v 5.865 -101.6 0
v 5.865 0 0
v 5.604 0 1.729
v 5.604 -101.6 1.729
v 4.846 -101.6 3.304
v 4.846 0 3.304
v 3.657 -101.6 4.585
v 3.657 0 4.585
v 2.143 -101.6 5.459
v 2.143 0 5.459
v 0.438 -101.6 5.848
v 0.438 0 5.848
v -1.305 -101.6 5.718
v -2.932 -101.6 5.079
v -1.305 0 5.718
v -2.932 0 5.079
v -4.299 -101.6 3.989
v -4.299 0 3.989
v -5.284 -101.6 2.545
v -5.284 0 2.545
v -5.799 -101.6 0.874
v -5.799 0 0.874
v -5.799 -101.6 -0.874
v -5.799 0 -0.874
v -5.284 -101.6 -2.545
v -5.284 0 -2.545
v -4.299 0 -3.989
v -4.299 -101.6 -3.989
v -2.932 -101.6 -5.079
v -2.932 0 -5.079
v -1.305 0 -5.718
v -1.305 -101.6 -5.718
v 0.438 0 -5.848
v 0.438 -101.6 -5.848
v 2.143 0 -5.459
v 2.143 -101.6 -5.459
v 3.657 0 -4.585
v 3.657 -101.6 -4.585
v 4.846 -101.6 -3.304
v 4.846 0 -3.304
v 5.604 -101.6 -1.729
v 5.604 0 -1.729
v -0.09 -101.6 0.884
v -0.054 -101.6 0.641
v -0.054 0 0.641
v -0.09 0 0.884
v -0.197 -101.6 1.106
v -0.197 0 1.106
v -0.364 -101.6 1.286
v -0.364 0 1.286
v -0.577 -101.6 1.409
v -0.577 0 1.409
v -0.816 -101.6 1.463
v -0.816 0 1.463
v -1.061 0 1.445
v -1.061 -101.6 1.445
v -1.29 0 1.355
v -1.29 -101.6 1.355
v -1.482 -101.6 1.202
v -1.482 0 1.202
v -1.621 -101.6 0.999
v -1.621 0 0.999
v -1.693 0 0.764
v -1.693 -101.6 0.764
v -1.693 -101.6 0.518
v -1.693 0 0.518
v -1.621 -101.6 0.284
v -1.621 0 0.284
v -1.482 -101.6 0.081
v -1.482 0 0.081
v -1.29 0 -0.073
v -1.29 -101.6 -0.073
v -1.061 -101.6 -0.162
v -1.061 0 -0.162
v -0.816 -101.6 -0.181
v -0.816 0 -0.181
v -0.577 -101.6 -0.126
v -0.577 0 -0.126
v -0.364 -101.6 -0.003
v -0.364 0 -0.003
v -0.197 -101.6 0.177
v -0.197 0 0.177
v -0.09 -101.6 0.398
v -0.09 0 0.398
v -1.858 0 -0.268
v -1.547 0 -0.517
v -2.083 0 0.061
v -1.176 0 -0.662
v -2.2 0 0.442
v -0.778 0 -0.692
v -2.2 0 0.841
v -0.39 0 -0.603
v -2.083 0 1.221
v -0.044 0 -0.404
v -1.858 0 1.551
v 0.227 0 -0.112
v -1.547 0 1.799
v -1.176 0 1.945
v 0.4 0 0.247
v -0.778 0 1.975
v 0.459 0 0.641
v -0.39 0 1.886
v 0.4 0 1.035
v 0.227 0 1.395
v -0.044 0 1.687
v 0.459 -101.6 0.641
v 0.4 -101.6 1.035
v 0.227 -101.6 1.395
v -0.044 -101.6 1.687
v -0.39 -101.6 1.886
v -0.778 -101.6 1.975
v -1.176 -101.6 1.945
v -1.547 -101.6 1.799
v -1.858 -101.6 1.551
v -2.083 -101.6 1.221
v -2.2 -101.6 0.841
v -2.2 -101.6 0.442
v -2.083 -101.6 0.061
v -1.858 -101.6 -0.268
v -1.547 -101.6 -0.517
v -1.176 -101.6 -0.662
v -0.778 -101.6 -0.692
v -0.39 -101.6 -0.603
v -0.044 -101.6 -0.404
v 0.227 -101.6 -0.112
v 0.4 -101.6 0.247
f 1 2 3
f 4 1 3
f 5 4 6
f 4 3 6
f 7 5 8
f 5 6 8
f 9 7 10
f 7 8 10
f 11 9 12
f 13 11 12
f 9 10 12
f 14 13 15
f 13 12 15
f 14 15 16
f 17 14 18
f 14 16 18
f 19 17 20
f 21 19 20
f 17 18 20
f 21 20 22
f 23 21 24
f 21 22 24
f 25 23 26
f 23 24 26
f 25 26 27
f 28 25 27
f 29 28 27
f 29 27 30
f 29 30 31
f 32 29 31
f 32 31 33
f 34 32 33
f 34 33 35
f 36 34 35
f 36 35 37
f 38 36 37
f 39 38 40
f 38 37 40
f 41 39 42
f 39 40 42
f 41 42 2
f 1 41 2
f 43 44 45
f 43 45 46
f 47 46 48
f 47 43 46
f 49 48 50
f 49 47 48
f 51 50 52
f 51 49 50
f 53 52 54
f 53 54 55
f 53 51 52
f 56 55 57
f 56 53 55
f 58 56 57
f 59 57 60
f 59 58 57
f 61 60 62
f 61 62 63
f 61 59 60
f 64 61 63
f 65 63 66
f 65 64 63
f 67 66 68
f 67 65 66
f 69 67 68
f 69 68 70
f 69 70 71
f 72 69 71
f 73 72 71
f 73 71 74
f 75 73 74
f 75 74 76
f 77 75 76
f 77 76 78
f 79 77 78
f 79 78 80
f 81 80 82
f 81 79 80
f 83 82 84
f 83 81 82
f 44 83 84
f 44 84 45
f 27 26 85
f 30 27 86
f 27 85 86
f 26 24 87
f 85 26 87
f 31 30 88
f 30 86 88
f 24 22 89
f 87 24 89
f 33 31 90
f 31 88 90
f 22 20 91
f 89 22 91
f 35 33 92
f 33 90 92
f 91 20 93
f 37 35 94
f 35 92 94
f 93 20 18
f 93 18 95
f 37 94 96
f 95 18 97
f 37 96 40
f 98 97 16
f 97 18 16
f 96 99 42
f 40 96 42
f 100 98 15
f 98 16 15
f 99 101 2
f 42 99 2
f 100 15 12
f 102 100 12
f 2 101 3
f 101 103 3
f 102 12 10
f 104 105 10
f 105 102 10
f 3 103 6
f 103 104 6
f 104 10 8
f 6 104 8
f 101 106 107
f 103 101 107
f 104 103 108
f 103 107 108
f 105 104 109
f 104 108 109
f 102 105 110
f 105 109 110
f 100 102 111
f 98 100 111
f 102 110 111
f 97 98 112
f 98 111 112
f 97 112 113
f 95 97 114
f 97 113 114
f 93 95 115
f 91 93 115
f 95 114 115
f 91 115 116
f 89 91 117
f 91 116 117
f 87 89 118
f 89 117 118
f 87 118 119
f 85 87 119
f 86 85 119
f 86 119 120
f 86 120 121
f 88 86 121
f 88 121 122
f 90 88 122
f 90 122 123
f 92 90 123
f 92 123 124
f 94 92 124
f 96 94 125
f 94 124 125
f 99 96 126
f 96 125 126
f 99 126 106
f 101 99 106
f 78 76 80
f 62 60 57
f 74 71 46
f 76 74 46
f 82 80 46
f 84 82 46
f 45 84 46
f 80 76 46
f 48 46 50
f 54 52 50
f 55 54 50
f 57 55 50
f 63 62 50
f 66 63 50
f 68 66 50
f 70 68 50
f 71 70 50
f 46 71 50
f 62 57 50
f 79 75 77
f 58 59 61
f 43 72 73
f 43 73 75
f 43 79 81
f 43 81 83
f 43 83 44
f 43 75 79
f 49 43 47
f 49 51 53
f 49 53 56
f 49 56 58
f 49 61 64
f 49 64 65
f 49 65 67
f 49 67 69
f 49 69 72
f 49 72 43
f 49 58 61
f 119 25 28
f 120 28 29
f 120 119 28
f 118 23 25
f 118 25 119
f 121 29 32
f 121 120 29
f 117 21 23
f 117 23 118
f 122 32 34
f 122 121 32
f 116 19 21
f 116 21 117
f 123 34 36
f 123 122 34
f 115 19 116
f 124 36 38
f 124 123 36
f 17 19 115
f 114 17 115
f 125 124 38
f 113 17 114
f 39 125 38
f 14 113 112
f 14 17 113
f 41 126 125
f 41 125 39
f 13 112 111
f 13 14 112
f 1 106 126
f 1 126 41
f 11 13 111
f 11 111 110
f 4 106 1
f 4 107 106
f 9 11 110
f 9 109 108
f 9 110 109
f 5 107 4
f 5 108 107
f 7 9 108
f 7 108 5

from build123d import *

# Parameters (mm, degrees)
F0_R     = 5.86475
F1_DEPTH = 101.6
F2_R     = 1.337206
F2_R_2   = 0.824327
F3_DEPTH = 101.6


with BuildPart() as f1:
    # F0 (on Front) → F1 (new body)
    with BuildSketch(Plane.XZ):
        Circle(F0_R)
    extrude(amount=F1_DEPTH)

    # F2 (on face) → F3 (cut)
    with BuildSketch(Plane.XZ.offset(101.6)):
        with Locations((-0.878043, 0.641273)):
            Circle(F2_R)
        with Locations((-0.878043, 0.641273)):
            Circle(F2_R_2, mode=Mode.SUBTRACT)
    extrude(amount=-F3_DEPTH, mode=Mode.SUBTRACT)


solid = f1.part
